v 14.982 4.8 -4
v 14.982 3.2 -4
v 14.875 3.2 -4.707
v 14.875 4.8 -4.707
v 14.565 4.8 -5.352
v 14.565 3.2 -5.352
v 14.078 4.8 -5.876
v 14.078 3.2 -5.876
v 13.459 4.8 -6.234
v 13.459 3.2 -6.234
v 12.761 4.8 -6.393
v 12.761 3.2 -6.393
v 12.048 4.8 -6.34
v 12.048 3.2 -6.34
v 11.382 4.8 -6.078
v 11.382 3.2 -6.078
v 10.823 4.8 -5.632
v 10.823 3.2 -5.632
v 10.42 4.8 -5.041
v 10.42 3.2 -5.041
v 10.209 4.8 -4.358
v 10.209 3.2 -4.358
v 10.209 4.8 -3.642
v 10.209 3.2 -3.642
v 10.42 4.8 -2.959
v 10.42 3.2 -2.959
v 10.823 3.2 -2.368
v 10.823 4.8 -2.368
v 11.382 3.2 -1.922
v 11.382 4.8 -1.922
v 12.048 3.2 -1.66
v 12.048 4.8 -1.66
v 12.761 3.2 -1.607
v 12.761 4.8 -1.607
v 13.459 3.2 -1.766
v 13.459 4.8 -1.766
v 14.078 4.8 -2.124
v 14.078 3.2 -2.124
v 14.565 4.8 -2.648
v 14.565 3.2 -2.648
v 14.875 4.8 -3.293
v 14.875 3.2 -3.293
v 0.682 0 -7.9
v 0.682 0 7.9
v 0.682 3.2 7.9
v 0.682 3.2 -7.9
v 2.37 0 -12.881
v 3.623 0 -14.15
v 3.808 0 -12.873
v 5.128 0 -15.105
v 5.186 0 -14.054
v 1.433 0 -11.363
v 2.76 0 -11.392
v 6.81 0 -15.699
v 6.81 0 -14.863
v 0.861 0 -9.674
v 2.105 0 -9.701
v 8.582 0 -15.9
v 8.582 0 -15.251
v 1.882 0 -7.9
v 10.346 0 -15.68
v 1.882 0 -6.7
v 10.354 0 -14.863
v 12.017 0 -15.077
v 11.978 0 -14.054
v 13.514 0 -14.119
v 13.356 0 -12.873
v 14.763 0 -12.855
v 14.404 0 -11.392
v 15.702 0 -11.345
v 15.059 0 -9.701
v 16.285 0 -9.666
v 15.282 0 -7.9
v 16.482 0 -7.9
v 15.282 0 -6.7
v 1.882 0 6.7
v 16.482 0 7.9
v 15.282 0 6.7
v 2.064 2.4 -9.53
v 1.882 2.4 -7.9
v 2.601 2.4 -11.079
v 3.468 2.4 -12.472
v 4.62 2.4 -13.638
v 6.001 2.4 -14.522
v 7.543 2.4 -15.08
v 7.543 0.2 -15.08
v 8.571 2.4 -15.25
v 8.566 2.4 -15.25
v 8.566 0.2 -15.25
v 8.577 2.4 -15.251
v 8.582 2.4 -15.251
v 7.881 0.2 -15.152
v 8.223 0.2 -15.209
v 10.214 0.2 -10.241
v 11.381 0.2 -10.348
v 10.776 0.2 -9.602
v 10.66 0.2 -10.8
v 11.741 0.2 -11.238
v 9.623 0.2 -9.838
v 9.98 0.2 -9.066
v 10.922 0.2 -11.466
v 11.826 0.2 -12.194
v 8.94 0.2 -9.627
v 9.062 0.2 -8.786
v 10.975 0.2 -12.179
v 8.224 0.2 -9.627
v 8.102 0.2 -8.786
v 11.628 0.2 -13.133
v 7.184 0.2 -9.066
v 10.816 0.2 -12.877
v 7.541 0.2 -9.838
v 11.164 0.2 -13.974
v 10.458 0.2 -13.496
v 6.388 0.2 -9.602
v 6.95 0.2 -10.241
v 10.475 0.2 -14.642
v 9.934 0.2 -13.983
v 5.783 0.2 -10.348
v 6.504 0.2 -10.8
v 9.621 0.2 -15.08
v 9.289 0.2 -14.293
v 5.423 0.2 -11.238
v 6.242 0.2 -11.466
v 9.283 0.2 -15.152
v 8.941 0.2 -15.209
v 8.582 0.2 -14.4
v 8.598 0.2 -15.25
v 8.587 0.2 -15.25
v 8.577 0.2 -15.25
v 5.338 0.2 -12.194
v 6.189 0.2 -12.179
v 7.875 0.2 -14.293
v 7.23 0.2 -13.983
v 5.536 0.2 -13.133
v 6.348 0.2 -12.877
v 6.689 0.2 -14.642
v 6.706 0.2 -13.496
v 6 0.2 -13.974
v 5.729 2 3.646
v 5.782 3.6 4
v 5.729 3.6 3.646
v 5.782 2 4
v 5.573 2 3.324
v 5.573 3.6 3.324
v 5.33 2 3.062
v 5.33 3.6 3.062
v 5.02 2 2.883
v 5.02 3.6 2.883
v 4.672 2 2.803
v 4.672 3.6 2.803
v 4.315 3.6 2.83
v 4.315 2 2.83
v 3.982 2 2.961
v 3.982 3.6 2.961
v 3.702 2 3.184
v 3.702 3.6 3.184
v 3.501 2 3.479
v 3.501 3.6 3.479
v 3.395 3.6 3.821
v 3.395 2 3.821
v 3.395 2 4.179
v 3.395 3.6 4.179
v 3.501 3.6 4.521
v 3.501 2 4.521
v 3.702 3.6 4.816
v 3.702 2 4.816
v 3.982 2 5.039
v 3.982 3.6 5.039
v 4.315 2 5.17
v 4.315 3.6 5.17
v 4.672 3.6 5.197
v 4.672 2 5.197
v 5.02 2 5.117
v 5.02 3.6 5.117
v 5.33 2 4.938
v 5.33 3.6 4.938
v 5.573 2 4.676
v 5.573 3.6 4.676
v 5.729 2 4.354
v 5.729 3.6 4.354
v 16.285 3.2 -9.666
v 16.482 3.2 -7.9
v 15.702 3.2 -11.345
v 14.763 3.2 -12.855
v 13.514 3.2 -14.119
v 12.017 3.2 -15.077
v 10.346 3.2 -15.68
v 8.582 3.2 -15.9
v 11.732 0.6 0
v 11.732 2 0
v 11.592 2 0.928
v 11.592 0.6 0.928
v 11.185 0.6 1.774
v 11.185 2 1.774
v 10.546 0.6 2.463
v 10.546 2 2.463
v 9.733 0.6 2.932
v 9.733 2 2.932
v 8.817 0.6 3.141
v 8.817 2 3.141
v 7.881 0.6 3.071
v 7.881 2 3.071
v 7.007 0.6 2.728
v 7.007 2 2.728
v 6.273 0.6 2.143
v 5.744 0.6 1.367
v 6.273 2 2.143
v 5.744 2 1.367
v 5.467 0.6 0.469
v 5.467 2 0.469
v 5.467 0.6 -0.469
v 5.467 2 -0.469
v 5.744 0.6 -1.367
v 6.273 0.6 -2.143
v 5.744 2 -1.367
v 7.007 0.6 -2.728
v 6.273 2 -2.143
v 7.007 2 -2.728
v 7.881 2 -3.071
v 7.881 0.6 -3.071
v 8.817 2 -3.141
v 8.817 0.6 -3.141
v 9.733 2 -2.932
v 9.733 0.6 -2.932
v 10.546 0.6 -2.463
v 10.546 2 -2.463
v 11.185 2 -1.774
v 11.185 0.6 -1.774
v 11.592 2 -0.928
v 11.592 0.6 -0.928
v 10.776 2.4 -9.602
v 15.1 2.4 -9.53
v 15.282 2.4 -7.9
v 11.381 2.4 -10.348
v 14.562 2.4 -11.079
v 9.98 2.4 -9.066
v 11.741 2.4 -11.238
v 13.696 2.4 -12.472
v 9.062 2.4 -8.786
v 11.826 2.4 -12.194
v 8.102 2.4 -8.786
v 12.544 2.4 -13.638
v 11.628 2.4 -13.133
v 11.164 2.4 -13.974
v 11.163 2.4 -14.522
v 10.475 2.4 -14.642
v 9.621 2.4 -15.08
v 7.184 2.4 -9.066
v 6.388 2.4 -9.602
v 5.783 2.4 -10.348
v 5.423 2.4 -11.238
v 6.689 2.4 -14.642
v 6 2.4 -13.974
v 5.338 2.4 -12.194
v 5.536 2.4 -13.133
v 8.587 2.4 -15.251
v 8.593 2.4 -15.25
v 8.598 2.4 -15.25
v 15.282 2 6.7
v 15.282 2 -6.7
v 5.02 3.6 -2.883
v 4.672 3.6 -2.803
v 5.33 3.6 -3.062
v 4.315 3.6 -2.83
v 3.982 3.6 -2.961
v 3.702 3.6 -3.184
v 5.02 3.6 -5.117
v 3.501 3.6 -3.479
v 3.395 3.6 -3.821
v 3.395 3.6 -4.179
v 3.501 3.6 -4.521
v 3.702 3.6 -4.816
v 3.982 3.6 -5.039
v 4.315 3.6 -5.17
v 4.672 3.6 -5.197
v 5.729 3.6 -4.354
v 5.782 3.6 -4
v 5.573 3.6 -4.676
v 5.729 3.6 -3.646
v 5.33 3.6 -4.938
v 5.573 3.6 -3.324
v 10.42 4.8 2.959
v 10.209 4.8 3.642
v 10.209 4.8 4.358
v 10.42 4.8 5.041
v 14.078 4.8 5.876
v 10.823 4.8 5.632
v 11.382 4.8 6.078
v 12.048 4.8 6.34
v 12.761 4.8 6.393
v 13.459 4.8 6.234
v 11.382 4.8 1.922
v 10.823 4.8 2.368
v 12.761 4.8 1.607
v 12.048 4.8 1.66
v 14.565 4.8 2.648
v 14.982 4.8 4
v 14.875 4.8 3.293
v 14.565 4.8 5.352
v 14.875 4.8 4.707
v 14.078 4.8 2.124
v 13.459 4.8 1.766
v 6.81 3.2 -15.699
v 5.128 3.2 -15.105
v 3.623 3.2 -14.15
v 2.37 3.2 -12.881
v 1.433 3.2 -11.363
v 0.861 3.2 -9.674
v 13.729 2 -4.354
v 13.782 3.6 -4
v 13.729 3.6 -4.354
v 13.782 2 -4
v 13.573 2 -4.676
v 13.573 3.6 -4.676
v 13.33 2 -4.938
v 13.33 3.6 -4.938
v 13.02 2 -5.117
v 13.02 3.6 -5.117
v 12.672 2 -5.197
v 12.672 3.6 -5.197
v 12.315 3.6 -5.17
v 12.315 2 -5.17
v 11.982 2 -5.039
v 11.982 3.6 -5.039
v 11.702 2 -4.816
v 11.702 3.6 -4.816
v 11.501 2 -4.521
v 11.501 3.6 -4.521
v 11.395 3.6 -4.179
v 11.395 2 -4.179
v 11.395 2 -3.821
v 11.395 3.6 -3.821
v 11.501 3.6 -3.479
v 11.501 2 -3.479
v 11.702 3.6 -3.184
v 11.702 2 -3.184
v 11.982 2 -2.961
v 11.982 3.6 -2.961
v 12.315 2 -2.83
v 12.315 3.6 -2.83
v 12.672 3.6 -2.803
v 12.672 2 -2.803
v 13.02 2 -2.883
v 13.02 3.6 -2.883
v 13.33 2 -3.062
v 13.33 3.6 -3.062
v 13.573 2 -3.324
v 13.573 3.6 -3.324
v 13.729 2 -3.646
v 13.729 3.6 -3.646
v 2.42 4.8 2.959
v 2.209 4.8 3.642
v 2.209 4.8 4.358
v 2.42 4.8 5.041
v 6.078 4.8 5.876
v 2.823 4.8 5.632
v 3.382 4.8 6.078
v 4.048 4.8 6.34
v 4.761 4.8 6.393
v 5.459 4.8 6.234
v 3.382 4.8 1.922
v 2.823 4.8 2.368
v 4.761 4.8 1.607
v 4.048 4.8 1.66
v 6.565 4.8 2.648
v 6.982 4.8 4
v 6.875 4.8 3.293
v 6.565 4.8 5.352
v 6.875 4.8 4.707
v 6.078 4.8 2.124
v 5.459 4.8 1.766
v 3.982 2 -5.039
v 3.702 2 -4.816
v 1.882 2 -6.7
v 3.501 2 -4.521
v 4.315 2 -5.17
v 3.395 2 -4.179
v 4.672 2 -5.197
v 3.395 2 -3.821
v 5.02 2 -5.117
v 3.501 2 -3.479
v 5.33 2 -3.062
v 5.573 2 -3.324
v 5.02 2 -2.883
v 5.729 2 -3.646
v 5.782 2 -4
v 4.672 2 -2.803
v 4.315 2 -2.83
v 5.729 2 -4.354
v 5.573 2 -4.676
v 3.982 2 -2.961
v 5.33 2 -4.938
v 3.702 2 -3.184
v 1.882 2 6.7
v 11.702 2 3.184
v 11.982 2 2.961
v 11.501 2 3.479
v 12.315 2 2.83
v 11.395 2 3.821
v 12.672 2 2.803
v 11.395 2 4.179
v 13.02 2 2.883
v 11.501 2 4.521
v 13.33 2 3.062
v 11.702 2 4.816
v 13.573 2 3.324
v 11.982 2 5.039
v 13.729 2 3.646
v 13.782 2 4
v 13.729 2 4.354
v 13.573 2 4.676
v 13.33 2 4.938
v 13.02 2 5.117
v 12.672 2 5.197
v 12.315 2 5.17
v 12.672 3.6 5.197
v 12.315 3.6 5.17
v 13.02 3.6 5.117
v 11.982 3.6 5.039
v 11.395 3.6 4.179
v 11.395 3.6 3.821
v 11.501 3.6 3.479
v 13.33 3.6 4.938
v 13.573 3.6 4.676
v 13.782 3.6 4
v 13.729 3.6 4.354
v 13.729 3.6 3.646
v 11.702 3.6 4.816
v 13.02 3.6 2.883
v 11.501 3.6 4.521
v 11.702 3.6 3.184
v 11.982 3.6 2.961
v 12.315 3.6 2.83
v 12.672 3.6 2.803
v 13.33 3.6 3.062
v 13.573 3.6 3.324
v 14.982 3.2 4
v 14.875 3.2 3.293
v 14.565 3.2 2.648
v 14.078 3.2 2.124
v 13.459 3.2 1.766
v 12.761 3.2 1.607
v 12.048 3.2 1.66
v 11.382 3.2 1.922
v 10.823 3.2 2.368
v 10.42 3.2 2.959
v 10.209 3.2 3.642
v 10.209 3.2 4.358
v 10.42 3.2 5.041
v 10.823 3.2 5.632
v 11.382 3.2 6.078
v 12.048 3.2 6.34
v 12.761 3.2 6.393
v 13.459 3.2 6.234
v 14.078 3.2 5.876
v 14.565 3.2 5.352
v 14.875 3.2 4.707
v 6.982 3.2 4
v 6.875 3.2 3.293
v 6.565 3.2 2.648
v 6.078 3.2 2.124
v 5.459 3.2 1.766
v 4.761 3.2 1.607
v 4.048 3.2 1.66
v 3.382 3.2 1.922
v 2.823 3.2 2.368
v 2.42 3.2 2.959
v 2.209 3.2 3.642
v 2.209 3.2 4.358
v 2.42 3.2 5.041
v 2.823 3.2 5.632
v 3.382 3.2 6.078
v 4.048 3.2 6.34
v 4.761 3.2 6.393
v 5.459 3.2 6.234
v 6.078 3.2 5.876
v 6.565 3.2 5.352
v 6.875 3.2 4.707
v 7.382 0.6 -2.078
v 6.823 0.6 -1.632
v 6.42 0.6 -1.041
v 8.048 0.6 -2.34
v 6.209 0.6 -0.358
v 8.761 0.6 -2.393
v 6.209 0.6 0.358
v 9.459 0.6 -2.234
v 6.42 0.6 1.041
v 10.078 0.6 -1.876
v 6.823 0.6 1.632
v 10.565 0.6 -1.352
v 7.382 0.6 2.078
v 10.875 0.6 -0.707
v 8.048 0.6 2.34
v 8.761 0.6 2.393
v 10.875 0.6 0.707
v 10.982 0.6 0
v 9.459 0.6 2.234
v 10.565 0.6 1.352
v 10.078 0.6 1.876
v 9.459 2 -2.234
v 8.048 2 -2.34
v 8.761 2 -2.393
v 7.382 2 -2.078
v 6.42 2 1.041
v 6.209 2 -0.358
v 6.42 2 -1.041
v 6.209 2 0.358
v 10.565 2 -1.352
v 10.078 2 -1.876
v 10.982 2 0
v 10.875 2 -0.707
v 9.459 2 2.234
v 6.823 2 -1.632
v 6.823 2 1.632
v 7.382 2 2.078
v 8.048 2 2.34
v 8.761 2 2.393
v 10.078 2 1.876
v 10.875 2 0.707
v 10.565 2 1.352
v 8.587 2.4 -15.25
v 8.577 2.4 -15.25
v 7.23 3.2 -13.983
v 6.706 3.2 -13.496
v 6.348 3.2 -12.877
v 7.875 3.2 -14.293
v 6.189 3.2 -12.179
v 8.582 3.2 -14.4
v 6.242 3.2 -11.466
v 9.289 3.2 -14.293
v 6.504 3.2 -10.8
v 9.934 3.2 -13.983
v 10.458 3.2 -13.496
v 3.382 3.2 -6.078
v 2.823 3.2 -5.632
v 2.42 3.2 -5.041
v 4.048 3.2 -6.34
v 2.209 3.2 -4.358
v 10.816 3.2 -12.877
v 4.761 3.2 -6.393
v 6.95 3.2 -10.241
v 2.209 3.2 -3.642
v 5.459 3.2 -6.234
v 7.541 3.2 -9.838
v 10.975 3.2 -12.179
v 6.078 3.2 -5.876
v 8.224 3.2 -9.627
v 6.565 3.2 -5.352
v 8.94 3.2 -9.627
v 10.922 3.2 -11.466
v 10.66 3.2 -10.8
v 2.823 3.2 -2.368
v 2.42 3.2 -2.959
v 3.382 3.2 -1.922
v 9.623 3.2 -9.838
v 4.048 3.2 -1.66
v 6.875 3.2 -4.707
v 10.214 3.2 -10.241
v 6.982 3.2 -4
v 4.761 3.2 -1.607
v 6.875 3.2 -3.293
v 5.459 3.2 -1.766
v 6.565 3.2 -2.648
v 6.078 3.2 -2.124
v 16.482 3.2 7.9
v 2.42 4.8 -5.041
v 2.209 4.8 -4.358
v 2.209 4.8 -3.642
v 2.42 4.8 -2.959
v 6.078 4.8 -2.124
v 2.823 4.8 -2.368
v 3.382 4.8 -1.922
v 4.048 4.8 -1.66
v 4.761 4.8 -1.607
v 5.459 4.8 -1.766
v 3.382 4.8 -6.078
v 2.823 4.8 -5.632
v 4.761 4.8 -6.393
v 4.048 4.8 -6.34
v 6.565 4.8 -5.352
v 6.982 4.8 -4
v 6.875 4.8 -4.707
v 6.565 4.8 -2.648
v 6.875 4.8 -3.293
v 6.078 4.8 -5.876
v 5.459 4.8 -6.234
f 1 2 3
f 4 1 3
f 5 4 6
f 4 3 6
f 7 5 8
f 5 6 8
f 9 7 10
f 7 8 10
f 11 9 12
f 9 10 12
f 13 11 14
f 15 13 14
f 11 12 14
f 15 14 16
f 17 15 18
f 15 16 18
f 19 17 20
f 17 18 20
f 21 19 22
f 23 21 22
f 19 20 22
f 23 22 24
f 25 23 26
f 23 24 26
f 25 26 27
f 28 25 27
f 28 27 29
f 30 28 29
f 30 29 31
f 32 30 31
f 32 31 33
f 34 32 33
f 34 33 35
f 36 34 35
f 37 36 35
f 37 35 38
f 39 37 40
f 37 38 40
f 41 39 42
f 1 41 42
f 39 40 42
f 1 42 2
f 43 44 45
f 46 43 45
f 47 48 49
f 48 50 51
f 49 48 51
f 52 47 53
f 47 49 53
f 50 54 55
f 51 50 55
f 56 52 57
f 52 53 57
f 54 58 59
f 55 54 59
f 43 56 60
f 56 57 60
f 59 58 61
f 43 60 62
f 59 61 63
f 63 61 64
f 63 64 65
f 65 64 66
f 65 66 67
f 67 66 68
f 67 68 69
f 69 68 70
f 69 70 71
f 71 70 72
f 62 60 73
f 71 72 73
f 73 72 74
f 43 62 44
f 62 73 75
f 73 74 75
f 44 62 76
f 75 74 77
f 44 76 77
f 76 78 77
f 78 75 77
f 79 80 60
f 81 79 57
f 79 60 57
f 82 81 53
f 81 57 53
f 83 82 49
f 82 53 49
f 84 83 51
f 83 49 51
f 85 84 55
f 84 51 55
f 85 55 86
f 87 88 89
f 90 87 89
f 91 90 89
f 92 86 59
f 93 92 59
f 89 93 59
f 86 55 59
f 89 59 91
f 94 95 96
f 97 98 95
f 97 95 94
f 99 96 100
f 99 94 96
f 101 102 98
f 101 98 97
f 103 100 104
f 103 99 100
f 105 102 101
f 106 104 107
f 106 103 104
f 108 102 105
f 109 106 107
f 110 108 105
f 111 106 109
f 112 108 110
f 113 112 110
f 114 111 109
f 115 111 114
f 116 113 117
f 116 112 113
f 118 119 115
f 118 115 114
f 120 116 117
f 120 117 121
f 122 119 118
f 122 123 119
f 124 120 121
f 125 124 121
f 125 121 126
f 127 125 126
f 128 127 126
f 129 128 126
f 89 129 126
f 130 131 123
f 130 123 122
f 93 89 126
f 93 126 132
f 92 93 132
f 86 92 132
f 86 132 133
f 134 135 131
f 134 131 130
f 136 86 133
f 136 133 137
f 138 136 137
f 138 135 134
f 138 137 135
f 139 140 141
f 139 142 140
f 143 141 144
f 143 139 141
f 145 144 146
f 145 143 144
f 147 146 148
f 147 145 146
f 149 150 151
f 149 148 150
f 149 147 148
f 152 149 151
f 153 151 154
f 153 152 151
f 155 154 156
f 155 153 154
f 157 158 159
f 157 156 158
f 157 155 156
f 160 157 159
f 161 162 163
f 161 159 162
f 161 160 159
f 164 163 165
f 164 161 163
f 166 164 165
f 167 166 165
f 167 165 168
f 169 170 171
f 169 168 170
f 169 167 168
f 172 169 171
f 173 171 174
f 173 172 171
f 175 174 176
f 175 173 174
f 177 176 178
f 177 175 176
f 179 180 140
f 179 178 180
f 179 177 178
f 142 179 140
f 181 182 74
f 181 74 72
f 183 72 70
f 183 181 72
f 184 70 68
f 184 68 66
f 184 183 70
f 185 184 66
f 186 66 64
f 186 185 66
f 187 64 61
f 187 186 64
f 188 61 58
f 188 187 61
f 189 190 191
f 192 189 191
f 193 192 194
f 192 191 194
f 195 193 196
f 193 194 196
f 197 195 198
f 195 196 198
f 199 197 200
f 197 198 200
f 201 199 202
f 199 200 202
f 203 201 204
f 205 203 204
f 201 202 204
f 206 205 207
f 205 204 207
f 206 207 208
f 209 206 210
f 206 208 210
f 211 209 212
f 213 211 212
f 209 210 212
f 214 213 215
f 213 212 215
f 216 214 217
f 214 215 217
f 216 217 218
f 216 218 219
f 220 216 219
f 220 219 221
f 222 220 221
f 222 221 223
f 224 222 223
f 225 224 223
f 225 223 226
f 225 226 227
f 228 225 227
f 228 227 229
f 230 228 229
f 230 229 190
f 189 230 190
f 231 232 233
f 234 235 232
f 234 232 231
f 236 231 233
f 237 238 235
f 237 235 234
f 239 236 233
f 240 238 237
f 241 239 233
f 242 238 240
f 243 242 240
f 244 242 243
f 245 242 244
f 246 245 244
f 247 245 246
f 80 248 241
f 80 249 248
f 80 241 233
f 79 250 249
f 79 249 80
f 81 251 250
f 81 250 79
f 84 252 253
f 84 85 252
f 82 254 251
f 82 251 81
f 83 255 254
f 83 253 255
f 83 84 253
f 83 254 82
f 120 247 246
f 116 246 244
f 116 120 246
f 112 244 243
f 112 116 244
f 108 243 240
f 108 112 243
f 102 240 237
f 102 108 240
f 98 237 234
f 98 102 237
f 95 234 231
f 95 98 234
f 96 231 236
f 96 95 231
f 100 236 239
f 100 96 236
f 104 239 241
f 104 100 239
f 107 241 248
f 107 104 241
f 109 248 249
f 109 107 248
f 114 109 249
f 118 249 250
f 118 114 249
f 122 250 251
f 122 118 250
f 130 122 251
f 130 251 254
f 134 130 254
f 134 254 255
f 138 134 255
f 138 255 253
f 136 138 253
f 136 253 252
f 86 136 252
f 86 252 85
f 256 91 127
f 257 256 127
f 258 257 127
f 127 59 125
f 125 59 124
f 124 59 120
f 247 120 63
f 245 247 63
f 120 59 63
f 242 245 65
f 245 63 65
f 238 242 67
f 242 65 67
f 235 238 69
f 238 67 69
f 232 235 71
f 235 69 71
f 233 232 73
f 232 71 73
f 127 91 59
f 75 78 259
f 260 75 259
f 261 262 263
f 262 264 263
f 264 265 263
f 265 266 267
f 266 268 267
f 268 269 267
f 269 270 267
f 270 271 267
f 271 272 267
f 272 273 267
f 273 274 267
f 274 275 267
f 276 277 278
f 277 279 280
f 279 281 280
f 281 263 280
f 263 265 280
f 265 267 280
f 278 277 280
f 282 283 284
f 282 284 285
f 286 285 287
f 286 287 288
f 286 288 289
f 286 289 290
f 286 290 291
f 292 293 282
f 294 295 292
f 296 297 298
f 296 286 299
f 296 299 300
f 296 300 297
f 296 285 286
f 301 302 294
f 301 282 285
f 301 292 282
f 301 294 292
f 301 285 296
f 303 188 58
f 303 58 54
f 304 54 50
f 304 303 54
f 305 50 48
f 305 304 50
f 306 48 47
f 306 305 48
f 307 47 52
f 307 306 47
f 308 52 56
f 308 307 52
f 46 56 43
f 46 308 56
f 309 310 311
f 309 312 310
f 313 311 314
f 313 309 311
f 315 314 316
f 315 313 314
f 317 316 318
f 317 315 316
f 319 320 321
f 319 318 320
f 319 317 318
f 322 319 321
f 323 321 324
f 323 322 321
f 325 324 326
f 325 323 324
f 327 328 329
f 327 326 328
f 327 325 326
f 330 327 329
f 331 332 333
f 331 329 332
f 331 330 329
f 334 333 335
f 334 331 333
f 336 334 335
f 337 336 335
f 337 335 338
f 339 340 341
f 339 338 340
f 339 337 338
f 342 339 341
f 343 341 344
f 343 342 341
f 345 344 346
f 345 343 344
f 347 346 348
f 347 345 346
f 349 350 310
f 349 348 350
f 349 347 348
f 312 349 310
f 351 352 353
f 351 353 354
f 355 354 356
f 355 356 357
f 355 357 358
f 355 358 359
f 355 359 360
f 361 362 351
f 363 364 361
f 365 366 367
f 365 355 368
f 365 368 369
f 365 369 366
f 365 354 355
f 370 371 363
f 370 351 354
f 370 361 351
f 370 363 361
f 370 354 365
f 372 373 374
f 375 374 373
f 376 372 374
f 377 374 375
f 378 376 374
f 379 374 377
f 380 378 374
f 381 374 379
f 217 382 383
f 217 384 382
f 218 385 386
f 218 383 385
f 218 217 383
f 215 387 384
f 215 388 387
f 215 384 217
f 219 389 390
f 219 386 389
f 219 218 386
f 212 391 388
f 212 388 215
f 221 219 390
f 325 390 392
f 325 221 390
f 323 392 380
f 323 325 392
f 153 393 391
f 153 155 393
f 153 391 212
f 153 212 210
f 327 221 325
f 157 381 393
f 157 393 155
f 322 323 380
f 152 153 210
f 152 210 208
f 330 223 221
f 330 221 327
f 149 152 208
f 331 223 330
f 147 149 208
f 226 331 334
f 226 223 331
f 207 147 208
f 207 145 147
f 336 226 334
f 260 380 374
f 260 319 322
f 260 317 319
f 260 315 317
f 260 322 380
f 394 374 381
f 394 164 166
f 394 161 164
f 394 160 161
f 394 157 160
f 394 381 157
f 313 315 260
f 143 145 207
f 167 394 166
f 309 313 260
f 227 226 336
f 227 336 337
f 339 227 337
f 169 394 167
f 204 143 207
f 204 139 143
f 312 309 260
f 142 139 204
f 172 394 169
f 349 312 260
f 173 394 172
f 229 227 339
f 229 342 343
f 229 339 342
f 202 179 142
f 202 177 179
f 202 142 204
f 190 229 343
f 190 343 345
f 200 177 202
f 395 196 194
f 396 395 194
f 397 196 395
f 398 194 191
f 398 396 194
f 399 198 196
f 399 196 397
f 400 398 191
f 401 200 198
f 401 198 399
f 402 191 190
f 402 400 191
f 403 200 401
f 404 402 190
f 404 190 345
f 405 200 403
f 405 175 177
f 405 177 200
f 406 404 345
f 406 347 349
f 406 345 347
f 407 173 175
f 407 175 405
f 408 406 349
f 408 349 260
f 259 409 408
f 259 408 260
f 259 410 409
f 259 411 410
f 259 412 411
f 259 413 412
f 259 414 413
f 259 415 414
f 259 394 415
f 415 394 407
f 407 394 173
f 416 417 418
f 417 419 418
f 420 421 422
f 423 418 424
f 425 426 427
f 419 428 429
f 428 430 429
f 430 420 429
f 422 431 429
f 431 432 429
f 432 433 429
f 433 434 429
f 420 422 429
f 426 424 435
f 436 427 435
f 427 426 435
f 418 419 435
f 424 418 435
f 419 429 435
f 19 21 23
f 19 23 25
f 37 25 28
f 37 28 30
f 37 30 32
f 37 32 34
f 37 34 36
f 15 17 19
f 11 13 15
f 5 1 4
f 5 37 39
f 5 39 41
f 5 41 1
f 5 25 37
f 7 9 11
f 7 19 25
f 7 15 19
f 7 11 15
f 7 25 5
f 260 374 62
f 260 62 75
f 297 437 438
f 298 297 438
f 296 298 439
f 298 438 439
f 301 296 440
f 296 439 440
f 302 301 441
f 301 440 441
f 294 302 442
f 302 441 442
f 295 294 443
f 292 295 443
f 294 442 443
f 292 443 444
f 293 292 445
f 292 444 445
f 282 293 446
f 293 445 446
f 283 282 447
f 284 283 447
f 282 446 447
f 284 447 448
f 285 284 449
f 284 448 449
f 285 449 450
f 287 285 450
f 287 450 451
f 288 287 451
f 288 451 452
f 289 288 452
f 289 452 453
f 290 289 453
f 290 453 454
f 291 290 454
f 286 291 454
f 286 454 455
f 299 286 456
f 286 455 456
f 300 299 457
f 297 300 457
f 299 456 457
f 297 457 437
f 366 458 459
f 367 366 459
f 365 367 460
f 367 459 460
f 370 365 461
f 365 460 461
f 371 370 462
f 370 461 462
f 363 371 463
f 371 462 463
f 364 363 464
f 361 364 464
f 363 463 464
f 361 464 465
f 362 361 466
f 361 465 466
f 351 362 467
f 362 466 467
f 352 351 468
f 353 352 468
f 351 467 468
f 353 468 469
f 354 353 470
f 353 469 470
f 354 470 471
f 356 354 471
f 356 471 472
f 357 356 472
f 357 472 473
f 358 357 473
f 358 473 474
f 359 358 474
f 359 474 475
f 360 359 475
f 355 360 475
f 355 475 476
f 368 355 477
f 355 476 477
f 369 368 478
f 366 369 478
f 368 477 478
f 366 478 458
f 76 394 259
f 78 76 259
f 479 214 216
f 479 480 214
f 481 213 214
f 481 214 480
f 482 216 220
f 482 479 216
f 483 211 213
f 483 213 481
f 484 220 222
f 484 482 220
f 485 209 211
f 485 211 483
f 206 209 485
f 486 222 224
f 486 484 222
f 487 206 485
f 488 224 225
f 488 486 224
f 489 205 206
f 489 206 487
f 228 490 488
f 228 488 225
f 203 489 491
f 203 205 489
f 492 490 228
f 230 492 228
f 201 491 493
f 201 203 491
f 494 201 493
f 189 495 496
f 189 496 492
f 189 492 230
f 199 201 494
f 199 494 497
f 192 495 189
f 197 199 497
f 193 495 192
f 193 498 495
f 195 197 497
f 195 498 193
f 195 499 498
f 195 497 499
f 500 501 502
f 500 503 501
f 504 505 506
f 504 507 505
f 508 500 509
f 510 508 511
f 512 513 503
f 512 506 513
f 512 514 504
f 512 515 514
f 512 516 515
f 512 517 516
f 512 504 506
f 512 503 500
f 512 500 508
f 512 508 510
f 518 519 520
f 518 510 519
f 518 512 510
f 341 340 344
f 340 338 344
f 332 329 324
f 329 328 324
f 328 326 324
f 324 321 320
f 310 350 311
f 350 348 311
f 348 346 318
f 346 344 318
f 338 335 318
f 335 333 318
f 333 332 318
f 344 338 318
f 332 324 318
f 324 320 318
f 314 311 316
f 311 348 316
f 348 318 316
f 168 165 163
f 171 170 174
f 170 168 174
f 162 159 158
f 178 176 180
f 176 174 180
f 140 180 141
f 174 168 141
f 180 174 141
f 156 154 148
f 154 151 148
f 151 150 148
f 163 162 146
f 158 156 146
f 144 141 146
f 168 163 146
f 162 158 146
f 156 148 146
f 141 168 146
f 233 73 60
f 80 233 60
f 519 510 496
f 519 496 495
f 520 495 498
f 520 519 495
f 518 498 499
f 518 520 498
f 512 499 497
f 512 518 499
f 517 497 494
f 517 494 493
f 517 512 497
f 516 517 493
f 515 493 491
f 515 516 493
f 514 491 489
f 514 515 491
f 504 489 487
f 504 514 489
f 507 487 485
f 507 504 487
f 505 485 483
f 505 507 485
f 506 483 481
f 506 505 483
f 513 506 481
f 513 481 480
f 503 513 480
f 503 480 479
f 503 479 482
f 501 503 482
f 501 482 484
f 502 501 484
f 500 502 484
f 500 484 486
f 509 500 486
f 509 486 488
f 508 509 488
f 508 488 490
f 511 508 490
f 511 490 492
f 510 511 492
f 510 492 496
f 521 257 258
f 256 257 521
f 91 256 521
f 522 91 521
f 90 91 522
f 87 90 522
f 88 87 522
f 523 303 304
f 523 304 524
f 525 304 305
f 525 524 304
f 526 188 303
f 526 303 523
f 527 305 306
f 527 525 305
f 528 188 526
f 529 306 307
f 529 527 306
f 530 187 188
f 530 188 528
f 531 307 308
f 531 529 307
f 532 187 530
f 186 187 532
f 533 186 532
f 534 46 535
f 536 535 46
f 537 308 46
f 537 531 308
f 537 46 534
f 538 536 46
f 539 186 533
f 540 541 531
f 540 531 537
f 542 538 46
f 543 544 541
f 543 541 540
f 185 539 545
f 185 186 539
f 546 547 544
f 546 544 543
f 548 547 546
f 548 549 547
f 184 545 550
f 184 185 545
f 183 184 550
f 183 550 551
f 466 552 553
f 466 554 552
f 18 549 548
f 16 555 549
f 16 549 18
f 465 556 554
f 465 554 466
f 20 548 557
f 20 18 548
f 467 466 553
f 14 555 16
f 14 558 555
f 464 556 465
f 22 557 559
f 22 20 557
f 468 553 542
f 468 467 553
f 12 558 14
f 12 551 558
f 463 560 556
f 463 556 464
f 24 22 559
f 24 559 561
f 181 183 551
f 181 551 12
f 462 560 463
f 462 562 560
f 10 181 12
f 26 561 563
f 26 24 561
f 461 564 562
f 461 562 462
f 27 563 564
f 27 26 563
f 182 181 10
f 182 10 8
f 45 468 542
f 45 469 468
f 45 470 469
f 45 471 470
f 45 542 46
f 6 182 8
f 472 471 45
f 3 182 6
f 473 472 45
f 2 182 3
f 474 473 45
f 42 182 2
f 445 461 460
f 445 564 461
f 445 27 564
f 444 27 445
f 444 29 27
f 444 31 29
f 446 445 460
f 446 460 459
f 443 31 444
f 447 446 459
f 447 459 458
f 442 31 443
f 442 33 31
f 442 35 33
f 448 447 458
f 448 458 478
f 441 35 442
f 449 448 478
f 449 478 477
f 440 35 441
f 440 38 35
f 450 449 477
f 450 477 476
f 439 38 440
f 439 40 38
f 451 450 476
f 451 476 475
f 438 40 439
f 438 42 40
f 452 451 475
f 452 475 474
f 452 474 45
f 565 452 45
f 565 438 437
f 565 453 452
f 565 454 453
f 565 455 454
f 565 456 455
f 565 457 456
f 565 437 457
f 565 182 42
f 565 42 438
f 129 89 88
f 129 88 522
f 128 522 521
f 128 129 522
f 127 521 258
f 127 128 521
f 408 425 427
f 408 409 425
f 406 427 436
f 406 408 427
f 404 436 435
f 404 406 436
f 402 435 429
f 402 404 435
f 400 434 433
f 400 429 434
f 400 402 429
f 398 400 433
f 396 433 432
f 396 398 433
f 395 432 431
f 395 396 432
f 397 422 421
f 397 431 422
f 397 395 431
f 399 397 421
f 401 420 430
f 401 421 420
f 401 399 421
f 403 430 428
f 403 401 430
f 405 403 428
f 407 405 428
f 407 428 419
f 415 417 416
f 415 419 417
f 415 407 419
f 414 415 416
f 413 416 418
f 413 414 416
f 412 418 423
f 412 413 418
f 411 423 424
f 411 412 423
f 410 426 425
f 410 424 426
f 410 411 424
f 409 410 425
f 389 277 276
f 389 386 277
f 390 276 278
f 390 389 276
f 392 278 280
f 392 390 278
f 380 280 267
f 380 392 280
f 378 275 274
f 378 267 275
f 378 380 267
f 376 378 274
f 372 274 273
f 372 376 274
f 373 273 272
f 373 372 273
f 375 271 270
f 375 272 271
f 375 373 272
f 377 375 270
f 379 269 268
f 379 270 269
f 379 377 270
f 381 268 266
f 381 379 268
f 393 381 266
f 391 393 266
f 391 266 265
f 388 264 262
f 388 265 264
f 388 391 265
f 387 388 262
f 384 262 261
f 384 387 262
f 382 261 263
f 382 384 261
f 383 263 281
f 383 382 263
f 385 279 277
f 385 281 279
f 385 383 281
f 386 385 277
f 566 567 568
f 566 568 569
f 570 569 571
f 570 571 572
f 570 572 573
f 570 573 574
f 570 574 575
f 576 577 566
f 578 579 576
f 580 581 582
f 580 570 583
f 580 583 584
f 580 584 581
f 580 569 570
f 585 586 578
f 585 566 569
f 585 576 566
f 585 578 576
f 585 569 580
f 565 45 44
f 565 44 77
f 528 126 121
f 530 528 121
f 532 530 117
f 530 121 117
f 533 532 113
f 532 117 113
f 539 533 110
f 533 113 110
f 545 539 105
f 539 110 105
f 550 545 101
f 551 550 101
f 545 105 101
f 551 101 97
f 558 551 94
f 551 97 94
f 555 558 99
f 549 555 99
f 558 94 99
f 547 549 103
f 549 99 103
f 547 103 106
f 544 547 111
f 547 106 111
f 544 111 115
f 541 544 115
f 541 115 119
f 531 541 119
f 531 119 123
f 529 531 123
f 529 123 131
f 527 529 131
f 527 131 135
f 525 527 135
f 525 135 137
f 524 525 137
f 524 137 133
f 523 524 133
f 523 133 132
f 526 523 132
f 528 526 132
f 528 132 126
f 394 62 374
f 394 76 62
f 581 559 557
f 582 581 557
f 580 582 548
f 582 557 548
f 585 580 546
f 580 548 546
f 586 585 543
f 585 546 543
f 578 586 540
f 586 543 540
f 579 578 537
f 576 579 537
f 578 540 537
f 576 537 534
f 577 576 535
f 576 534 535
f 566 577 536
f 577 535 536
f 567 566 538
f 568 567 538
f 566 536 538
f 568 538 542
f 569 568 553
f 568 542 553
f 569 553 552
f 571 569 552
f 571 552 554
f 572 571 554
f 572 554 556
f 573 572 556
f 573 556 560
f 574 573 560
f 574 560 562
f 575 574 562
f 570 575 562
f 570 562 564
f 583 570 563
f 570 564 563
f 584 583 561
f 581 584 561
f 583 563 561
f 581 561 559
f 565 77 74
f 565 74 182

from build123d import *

# Parameters (mm, degrees)
MAINBASESKETCH_W          = 15.8
MAINBASESKETCH_H          = 3.2
MAINBASEEXTRUDE_DEPTH     = 7.9
STUDSSKETCH_R             = 2.4
STUDSEXTRUDE_DEPTH        = 1.6
STUDSPATTERN_COUNT        = 2
STUDSPATTERN_PITCH        = 8
STUDSPATTERN_COUNT_DIR2   = 2
STUDSPATTERN_PITCH_DIR2   = 8
MAINBASESHELL_T           = -1.2
UNDERSIDECIRCLEEXT_START  = -0.2
UNDERSIDECIRCLESKETCH_R   = 3.15
UNDERSIDECIRCLESKETCH_R_2 = 2.4
UNDERSIDECIRCLEEXT_DEPTH  = 1.6
SKETCH66_R                = 2.4
CUT_EXTRUDE19_DEPTH       = 24.398829954
CUT_EXTRUDE20_DEPTH       = 2.4
BOSS_EXTRUDE1_START       = -0.2
SKETCH66_6_R              = 3.25
SKETCH66_6_R_2            = 2.4
BOSS_EXTRUDE1_DEPTH       = 2.2


with BuildPart() as part:
    # MainBaseSketch → MainBaseExtrude (new, symmetric)
    with BuildSketch(Plane.XY):
        with Locations((8.581967213, 1.6)):
            Rectangle(MAINBASESKETCH_W, MAINBASESKETCH_H)
    extrude(amount=MAINBASEEXTRUDE_DEPTH, both=True)

    # StudsSketch → StudsExtrude (add)
    with BuildSketch(Plane(origin=(0, 3.2, 0), x_dir=(1, 0, 0), z_dir=(0, 1, 0))):
        with Locations((4.581967213, 4)):
            Circle(STUDSSKETCH_R)
    studsextrude = extrude(amount=STUDSEXTRUDE_DEPTH)

    # StudsPattern: StudsExtrude 2 × 2
    with Locations(*[(j * STUDSPATTERN_PITCH_DIR2, 0, i * STUDSPATTERN_PITCH) for i in range(STUDSPATTERN_COUNT) for j in range(STUDSPATTERN_COUNT_DIR2) if (i, j) != (0, 0)]):
        add(studsextrude)

    # MainBaseShell
    mainbaseshell_openings = [part.faces().sort_by_distance(p)[0] for p in [
        (8.581967213, 0, 0),
    ]]
    offset(amount=MAINBASESHELL_T, openings=mainbaseshell_openings, kind=Kind.INTERSECTION)

    # UnderSideCircleSketch → UnderSideCircleExt (add)
    with BuildSketch(Plane.XZ.offset(-2).offset(UNDERSIDECIRCLEEXT_START)):
        with Locations((8.581967213, 0)):
            Circle(UNDERSIDECIRCLESKETCH_R)
        with Locations((8.581967213, 0)):
            Circle(UNDERSIDECIRCLESKETCH_R_2, mode=Mode.SUBTRACT)
    extrude(amount=UNDERSIDECIRCLEEXT_DEPTH)

    # Sweep6: sweep along a curve in space
    with BuildLine() as sweep6_path:
        Line((16.481967213, 0, -7.9), (16.481967213, 3.2, -7.9))
    # Sketch64 → Sweep6 (sweep)
    with BuildSketch(Plane(origin=(0, 3.2, 0), x_dir=(1, 0, 0), z_dir=(0, 1, 0))):
        with BuildLine():
            Line((0.681967213, 7.9), (16.481967213, 7.9))
            ThreePointArc((16.481967213, 7.9), (14.174104013, 13.52161009), (8.581967213, 15.9))
            ThreePointArc((8.581967213, 15.9), (2.960357123, 13.550714964), (0.681967213, 7.9))
        make_face()
    sweep(path=sweep6_path.line)

    # Sketch66 → Cut-Extrude19 (cut, through all)
    with BuildSketch(Plane(origin=(0, 0, 0), x_dir=(-1, 0, 0), z_dir=(0, -1, 0))):
        with Locations((-8.581967213, 12)):
            Circle(SKETCH66_R)
    extrude(amount=-CUT_EXTRUDE19_DEPTH, mode=Mode.SUBTRACT)

    # Sketch68 → Cut-Extrude20 (cut)
    with BuildSketch(Plane(origin=(0, 0, 0), x_dir=(-1, 0, 0), z_dir=(0, -1, 0))):
        with BuildLine():
            Line((-15.281967213, 7.9), (-1.881967213, 7.9))
            ThreePointArc((-1.881967213, 7.9), (-3.808255779, 12.873274015), (-8.581967213, 15.251450042))
            ThreePointArc((-8.581967213, 15.251450042), (-13.355678647, 12.873274015), (-15.281967213, 7.9))
        make_face()
    extrude(amount=-CUT_EXTRUDE20_DEPTH, mode=Mode.SUBTRACT)

    # Sketch66<6> → Boss-Extrude1 (add)
    with BuildSketch(Plane(origin=(0, 0, 0), x_dir=(-1, 0, 0), z_dir=(0, -1, 0)).offset(BOSS_EXTRUDE1_START)):
        with Locations((-8.581967213, 12)):
            Circle(SKETCH66_6_R)
        with Locations((-8.581967213, 12)):
            Circle(SKETCH66_6_R_2, mode=Mode.SUBTRACT)
    extrude(amount=-BOSS_EXTRUDE1_DEPTH)


solid = part.part
